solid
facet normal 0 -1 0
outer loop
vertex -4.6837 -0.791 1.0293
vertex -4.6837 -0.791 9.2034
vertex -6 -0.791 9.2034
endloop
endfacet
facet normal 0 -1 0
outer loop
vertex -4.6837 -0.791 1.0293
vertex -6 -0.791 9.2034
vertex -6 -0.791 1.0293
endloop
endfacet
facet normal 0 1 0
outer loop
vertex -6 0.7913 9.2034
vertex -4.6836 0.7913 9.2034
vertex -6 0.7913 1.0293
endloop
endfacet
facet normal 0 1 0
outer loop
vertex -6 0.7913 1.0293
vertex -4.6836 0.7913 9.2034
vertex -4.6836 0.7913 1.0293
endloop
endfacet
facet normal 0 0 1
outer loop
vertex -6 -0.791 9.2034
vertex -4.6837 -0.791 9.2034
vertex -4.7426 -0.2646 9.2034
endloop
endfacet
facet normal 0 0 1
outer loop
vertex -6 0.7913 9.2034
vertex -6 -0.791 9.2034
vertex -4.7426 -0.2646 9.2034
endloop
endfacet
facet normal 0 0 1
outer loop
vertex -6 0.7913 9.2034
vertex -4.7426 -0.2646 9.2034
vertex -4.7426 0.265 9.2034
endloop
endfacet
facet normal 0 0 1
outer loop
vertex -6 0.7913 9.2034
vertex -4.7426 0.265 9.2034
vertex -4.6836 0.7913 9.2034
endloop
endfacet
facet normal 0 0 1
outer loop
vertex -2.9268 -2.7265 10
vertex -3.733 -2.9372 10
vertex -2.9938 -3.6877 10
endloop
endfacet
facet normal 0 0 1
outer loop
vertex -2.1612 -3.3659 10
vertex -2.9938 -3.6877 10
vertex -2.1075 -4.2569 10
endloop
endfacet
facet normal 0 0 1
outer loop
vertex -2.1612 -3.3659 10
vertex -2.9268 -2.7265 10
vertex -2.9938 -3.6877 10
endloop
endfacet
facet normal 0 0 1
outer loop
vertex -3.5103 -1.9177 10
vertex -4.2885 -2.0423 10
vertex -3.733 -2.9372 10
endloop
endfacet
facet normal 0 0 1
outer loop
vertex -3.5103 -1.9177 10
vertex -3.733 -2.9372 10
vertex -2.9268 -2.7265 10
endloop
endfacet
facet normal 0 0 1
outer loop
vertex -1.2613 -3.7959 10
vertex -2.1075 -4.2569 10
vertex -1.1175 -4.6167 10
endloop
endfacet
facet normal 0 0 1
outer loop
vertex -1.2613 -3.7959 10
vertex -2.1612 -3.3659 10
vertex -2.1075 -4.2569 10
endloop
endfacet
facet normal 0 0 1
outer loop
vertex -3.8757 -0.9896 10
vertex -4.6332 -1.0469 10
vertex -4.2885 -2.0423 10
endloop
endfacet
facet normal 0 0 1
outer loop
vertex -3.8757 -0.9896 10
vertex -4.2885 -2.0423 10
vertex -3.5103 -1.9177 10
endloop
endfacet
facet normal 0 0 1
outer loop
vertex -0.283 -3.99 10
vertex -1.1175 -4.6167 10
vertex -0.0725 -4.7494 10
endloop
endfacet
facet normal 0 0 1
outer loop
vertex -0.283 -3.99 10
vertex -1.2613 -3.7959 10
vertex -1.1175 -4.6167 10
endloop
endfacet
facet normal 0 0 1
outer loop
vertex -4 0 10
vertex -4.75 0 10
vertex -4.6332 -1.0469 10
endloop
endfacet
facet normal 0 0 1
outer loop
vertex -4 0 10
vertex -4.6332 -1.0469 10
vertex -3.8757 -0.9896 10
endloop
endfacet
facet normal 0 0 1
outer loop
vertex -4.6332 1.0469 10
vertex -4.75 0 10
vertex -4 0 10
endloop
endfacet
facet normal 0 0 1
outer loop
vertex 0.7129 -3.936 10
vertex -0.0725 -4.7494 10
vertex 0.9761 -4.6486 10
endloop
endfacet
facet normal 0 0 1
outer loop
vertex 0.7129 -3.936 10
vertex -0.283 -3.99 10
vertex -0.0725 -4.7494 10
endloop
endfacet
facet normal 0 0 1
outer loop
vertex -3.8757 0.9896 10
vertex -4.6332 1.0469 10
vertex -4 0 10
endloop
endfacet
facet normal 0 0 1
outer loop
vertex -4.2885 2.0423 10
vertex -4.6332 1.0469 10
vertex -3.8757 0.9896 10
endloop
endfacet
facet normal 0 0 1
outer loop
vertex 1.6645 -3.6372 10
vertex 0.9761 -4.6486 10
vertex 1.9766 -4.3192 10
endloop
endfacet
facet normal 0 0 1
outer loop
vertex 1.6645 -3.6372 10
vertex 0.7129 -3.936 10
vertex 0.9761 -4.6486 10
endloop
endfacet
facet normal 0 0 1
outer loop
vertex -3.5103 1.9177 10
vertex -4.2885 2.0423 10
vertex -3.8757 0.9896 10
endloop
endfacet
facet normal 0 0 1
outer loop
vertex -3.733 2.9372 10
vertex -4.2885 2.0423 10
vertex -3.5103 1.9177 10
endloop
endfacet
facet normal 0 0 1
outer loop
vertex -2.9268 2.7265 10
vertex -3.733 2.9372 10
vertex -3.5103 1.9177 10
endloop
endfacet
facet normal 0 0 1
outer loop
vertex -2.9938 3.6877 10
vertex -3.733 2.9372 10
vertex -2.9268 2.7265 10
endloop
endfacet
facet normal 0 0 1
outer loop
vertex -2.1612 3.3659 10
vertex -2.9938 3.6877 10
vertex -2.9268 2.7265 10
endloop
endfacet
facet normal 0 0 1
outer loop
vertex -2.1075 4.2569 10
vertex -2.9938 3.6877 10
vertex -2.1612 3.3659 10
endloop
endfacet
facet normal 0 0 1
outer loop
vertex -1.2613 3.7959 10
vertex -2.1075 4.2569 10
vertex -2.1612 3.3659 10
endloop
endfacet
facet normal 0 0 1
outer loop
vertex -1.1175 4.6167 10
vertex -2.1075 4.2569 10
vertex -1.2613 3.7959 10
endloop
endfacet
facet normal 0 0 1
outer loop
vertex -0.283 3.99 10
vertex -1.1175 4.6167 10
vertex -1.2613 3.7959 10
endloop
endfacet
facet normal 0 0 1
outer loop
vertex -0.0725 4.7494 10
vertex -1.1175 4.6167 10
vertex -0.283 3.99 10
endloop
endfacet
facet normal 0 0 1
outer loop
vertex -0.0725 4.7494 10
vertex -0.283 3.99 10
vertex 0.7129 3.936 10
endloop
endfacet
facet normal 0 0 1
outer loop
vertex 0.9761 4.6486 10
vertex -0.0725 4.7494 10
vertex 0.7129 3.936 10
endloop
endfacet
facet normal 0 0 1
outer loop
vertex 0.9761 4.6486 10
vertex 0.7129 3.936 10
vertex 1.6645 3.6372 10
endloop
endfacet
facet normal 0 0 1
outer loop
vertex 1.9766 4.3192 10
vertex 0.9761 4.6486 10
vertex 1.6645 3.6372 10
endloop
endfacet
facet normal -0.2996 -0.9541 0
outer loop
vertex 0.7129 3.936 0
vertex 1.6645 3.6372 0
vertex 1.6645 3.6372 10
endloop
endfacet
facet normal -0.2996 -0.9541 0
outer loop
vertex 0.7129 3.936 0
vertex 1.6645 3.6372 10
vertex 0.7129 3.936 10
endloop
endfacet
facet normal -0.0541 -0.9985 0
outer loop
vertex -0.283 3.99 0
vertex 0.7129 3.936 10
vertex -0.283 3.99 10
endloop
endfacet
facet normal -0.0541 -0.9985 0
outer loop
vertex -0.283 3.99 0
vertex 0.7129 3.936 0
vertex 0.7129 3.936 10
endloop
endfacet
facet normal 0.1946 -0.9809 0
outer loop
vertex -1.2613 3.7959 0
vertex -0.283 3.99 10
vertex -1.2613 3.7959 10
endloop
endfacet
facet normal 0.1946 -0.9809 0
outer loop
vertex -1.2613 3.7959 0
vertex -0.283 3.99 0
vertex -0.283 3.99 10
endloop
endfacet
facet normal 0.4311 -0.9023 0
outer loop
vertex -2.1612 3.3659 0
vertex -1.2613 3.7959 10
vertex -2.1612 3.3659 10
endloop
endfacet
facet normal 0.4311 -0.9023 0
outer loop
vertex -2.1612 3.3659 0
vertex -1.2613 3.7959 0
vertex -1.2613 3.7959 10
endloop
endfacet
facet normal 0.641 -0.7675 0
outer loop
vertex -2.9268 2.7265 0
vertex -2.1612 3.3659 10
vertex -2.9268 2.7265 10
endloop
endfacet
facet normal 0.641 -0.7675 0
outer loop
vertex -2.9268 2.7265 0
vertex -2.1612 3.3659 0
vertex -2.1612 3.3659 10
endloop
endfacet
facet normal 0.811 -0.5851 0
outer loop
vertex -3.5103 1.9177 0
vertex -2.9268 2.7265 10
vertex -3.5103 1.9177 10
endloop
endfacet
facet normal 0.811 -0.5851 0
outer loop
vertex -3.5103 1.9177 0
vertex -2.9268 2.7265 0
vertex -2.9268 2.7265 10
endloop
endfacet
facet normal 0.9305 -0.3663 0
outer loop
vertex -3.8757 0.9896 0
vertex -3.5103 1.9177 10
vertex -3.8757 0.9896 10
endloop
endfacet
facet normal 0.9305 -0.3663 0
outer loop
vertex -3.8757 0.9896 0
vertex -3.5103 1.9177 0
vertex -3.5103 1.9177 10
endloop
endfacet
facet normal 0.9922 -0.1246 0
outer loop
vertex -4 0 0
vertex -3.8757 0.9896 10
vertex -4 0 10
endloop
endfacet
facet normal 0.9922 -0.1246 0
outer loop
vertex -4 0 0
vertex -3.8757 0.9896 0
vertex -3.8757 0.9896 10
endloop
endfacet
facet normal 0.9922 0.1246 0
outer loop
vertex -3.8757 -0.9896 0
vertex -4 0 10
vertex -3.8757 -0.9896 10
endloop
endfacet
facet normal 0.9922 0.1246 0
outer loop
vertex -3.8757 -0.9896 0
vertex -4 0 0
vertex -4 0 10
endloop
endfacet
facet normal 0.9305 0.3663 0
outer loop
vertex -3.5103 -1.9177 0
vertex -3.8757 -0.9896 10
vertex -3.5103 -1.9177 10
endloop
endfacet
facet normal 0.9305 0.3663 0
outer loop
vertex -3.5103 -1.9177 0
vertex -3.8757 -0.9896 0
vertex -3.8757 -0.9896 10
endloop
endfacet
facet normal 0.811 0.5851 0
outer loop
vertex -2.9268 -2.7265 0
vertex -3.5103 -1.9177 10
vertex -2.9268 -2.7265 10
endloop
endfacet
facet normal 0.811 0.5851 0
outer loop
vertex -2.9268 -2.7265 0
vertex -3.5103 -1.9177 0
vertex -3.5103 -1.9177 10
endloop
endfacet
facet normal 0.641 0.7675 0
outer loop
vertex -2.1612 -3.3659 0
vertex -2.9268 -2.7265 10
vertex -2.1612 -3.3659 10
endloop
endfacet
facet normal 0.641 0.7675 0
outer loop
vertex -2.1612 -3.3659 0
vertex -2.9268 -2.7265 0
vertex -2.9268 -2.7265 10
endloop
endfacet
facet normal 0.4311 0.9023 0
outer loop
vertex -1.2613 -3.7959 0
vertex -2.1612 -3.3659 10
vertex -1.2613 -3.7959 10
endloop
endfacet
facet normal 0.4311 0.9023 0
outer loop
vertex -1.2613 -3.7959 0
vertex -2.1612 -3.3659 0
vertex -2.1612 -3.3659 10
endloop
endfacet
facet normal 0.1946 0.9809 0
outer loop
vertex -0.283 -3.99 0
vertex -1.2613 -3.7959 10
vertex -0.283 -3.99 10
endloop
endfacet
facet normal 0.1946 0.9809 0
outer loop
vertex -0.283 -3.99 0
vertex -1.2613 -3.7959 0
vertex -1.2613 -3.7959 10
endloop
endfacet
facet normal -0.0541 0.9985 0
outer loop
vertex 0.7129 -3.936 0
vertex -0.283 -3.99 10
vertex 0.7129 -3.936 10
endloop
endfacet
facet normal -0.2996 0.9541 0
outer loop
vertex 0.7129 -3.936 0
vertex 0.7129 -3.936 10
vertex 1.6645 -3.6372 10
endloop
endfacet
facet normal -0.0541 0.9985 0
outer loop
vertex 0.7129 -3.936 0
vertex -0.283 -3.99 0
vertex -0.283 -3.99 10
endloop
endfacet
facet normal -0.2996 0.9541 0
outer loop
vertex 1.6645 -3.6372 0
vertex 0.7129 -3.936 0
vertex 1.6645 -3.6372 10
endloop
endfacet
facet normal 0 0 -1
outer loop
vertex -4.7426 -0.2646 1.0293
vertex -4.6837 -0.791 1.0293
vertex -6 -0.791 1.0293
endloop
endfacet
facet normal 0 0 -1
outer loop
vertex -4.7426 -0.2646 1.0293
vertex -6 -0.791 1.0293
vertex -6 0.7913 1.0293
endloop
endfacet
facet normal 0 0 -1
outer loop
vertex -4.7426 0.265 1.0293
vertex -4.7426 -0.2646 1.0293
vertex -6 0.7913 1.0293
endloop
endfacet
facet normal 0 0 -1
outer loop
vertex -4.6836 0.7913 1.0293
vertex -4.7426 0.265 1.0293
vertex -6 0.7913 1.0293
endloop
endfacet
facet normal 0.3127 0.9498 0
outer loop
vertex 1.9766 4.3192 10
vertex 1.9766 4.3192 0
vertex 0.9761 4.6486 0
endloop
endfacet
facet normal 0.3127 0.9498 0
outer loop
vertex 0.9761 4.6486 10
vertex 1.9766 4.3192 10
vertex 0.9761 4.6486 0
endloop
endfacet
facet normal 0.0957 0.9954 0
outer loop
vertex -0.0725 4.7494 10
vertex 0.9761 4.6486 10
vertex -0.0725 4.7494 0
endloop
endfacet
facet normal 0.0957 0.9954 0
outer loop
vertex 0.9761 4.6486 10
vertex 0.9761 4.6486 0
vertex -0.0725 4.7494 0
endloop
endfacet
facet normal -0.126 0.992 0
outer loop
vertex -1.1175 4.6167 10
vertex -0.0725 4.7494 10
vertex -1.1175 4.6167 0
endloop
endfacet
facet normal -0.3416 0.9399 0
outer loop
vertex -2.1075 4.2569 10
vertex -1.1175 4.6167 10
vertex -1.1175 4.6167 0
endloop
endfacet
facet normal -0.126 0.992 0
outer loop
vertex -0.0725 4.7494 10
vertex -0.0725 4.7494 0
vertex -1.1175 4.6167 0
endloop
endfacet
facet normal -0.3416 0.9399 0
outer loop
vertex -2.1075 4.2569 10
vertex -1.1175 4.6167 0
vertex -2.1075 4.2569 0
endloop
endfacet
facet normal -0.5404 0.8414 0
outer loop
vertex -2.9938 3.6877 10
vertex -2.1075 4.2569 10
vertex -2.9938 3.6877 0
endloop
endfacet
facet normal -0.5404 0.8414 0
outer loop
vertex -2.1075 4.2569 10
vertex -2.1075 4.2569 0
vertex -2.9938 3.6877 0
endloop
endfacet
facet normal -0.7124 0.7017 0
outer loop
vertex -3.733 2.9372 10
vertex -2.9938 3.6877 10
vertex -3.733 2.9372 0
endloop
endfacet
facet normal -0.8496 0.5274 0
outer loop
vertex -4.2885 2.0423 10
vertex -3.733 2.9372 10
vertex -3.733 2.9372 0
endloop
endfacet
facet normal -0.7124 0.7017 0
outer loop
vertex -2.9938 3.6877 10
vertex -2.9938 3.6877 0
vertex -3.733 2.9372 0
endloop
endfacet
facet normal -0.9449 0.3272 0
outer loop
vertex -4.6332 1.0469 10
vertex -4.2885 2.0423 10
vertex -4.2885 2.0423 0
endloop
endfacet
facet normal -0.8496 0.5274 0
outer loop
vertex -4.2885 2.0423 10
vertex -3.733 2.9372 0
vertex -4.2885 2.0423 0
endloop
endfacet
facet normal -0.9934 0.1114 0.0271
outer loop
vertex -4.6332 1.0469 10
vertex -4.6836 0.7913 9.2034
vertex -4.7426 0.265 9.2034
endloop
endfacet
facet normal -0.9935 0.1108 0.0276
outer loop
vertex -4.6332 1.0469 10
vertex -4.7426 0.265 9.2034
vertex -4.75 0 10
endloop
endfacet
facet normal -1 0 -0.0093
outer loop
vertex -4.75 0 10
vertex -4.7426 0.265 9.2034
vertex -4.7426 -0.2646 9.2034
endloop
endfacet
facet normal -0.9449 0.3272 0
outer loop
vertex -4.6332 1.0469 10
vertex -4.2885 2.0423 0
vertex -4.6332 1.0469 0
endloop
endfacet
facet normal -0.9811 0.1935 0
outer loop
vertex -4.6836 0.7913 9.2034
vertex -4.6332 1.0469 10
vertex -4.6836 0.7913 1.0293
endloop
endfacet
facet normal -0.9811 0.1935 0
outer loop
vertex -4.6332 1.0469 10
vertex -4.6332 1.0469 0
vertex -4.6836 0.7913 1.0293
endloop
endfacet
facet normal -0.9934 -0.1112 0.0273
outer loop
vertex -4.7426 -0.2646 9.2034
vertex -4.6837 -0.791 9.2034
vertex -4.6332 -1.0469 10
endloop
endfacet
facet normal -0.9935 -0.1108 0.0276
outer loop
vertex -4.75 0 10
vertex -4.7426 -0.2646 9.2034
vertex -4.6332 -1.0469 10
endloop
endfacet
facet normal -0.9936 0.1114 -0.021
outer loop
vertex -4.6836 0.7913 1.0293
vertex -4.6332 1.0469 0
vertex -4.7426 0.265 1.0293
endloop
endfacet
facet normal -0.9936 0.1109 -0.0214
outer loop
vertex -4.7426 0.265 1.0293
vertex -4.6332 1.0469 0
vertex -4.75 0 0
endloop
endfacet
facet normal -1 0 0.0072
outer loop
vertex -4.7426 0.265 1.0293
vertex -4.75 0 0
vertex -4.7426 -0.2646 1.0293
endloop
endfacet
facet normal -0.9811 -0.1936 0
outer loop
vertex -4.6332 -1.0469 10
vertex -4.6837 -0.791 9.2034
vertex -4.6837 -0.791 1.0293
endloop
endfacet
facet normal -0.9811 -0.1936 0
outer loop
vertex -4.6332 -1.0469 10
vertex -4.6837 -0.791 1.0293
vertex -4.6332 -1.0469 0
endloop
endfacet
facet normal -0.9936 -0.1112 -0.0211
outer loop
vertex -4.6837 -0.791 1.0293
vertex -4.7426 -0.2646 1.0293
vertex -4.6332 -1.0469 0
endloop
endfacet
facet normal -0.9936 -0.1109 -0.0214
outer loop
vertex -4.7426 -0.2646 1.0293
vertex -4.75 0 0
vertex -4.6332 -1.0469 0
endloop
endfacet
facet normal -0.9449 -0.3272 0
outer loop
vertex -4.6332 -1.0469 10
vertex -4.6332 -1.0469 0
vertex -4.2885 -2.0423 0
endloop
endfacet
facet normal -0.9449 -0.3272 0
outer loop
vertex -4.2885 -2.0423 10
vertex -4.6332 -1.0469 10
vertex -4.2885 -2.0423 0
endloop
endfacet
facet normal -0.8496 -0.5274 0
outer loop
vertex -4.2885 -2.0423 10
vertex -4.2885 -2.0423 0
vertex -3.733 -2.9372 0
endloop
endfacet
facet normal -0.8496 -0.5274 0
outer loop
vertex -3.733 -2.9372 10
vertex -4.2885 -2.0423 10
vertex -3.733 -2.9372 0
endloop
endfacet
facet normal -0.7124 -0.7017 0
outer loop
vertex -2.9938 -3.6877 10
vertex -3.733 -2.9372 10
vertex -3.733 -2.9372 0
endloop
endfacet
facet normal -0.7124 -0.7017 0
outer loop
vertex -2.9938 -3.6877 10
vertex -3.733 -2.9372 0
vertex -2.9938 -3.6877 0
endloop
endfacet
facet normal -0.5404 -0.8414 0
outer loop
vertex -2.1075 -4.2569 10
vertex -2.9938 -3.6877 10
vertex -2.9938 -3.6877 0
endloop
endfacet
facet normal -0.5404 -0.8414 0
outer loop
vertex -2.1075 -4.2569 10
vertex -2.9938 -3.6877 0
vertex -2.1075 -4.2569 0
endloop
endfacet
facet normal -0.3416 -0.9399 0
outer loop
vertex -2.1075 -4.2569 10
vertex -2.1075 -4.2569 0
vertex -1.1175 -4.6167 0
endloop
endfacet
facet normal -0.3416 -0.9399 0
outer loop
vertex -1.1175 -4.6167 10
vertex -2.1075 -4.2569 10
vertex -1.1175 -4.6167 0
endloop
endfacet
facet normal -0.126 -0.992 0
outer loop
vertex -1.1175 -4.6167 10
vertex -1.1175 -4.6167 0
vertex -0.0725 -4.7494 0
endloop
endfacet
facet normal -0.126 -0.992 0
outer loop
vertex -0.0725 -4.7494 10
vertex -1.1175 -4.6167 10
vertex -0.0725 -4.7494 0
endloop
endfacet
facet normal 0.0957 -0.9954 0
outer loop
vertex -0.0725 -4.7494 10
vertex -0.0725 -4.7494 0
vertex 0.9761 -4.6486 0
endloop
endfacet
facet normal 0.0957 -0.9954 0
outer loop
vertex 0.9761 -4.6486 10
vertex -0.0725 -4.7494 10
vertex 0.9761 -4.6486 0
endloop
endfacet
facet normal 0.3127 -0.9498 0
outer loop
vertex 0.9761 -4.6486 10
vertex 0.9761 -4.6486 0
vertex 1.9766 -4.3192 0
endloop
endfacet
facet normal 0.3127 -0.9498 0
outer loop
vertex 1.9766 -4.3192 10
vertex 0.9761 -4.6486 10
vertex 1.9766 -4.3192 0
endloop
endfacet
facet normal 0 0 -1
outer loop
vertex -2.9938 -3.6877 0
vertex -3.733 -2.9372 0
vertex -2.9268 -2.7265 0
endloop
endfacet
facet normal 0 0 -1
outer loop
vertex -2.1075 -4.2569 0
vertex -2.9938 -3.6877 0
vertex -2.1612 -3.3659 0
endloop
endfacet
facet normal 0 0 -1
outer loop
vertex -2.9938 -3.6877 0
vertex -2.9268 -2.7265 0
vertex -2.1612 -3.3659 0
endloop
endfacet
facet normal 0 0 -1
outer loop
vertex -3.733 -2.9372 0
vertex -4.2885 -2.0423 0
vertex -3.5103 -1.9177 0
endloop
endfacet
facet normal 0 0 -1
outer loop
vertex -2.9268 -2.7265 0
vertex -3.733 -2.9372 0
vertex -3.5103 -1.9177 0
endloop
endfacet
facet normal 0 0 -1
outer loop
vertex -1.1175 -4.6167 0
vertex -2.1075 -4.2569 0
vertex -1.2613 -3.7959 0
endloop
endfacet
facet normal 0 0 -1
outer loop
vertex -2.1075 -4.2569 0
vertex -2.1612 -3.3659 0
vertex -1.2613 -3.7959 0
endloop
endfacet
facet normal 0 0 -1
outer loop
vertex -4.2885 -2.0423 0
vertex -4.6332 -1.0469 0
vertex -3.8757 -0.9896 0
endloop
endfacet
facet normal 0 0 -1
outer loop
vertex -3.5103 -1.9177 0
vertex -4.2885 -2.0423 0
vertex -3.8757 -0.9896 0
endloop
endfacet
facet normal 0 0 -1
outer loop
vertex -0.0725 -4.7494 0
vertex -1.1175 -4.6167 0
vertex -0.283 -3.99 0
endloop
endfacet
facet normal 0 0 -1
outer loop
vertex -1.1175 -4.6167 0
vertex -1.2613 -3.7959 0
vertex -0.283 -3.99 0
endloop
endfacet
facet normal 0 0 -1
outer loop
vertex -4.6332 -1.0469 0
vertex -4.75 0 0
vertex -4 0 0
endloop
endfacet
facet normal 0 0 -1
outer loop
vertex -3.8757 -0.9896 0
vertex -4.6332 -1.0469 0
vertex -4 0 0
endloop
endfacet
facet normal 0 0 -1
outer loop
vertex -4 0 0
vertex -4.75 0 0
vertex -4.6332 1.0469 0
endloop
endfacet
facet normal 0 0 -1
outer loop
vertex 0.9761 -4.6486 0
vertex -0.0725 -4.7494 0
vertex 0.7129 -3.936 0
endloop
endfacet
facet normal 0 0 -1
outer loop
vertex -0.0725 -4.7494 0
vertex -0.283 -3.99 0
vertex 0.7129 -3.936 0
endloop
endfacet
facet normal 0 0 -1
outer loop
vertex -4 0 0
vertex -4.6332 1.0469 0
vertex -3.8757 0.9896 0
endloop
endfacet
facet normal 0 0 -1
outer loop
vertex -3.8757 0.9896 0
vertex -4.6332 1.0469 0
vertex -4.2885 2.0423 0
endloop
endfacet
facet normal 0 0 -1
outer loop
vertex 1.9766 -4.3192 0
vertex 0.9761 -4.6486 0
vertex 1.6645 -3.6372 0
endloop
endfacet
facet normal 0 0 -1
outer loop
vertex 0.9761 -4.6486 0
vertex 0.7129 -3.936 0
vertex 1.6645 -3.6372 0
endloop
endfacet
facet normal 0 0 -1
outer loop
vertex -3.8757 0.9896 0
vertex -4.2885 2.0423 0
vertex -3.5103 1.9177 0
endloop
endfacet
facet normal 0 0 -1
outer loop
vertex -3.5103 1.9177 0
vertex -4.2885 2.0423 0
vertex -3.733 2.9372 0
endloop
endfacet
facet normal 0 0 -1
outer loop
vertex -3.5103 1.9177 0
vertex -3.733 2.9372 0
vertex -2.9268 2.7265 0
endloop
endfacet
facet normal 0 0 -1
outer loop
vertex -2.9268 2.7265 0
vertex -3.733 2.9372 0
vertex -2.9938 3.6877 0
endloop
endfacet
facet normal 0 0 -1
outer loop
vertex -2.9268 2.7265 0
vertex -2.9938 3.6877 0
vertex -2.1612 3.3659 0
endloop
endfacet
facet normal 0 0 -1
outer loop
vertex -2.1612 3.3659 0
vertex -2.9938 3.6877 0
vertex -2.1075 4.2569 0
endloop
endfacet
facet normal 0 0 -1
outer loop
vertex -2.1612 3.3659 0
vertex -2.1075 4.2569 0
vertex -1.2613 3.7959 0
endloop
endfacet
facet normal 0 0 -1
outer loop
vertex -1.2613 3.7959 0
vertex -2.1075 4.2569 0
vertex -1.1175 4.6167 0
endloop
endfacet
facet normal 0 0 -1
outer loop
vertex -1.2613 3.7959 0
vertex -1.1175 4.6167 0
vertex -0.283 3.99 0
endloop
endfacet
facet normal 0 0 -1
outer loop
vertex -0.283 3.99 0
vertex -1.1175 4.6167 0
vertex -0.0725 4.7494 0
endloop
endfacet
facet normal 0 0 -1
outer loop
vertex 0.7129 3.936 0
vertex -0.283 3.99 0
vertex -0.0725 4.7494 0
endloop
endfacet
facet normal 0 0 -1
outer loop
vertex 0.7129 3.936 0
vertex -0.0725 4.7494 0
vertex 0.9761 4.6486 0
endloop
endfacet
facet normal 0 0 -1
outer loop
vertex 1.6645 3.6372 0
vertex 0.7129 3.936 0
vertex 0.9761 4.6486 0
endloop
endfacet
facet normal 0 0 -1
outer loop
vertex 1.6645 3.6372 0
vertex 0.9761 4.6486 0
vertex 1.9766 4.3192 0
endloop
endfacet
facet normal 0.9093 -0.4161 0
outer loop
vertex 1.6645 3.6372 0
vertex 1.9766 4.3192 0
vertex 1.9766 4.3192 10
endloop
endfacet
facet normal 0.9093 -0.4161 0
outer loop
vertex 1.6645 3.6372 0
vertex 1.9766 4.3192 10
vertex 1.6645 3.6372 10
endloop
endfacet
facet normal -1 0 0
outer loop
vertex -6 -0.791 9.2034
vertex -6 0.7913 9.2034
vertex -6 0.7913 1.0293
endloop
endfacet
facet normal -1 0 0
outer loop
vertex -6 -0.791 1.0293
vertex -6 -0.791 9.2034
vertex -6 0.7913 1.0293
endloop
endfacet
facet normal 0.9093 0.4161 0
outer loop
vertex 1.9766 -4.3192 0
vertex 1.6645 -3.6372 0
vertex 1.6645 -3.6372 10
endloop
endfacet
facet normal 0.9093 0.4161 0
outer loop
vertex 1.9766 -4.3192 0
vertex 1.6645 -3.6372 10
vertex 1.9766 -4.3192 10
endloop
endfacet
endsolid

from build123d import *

# Parameters (mm, degrees)
SKETCH1_R           = 4.75
SKETCH1_R_2         = 4
BOSS_EXTRUDE1_DEPTH = 10
CUT_EXTRUDE2_DEPTH  = 10
SKETCH4_W           = 8.174166442
SKETCH4_H           = 1.582309943
BOSS_EXTRUDE2_DEPTH = 1.5


with BuildPart() as part:
    # Sketch1 → Boss-Extrude1 (new body)
    with BuildSketch(Plane.XY):
        Circle(SKETCH1_R)
        Circle(SKETCH1_R_2, mode=Mode.SUBTRACT)
    extrude(amount=BOSS_EXTRUDE1_DEPTH)

    # Sketch3 → Cut-Extrude2 (cut)
    with BuildSketch(Plane.XY.offset(10)):
        with BuildLine():
            ThreePointArc((1.66450103, 3.637229209), (3.365858295, 2.161249162), (4, 0))
            Line((4, 0), (4.75, 0))
            ThreePointArc((4.75, 0), (4.749994219, 0.007410728), (4.749976876, 0.014821438))
            ThreePointArc((4.749976876, 0.014821438), (3.992947753, 2.572716122), (1.976594973, 4.319209686))
            Line((1.976594973, 4.319209686), (1.66450103, 3.637229209))
        make_face()
        with BuildLine():
            Line((4.75, 0), (4, 0))
            ThreePointArc((4, 0), (3.365858295, -2.161249162), (1.66450103, -3.637229209))
            Line((1.66450103, -3.637229209), (1.976594973, -4.319209686))
            ThreePointArc((1.976594973, -4.319209686), (3.996956725, -2.56648338), (4.75, 0))
        make_face()
    extrude(amount=-CUT_EXTRUDE2_DEPTH, mode=Mode.SUBTRACT)

    # Sketch4 → Boss-Extrude2 (add)
    with BuildSketch(Plane(origin=(-4.5, 0, 0), x_dir=(0, 0, -1), z_dir=(1, 0, 0))):
        with Locations((-5.116351143, 0.000178202)):
            Rectangle(SKETCH4_W, SKETCH4_H)
    extrude(amount=-BOSS_EXTRUDE2_DEPTH)


solid = part.part
